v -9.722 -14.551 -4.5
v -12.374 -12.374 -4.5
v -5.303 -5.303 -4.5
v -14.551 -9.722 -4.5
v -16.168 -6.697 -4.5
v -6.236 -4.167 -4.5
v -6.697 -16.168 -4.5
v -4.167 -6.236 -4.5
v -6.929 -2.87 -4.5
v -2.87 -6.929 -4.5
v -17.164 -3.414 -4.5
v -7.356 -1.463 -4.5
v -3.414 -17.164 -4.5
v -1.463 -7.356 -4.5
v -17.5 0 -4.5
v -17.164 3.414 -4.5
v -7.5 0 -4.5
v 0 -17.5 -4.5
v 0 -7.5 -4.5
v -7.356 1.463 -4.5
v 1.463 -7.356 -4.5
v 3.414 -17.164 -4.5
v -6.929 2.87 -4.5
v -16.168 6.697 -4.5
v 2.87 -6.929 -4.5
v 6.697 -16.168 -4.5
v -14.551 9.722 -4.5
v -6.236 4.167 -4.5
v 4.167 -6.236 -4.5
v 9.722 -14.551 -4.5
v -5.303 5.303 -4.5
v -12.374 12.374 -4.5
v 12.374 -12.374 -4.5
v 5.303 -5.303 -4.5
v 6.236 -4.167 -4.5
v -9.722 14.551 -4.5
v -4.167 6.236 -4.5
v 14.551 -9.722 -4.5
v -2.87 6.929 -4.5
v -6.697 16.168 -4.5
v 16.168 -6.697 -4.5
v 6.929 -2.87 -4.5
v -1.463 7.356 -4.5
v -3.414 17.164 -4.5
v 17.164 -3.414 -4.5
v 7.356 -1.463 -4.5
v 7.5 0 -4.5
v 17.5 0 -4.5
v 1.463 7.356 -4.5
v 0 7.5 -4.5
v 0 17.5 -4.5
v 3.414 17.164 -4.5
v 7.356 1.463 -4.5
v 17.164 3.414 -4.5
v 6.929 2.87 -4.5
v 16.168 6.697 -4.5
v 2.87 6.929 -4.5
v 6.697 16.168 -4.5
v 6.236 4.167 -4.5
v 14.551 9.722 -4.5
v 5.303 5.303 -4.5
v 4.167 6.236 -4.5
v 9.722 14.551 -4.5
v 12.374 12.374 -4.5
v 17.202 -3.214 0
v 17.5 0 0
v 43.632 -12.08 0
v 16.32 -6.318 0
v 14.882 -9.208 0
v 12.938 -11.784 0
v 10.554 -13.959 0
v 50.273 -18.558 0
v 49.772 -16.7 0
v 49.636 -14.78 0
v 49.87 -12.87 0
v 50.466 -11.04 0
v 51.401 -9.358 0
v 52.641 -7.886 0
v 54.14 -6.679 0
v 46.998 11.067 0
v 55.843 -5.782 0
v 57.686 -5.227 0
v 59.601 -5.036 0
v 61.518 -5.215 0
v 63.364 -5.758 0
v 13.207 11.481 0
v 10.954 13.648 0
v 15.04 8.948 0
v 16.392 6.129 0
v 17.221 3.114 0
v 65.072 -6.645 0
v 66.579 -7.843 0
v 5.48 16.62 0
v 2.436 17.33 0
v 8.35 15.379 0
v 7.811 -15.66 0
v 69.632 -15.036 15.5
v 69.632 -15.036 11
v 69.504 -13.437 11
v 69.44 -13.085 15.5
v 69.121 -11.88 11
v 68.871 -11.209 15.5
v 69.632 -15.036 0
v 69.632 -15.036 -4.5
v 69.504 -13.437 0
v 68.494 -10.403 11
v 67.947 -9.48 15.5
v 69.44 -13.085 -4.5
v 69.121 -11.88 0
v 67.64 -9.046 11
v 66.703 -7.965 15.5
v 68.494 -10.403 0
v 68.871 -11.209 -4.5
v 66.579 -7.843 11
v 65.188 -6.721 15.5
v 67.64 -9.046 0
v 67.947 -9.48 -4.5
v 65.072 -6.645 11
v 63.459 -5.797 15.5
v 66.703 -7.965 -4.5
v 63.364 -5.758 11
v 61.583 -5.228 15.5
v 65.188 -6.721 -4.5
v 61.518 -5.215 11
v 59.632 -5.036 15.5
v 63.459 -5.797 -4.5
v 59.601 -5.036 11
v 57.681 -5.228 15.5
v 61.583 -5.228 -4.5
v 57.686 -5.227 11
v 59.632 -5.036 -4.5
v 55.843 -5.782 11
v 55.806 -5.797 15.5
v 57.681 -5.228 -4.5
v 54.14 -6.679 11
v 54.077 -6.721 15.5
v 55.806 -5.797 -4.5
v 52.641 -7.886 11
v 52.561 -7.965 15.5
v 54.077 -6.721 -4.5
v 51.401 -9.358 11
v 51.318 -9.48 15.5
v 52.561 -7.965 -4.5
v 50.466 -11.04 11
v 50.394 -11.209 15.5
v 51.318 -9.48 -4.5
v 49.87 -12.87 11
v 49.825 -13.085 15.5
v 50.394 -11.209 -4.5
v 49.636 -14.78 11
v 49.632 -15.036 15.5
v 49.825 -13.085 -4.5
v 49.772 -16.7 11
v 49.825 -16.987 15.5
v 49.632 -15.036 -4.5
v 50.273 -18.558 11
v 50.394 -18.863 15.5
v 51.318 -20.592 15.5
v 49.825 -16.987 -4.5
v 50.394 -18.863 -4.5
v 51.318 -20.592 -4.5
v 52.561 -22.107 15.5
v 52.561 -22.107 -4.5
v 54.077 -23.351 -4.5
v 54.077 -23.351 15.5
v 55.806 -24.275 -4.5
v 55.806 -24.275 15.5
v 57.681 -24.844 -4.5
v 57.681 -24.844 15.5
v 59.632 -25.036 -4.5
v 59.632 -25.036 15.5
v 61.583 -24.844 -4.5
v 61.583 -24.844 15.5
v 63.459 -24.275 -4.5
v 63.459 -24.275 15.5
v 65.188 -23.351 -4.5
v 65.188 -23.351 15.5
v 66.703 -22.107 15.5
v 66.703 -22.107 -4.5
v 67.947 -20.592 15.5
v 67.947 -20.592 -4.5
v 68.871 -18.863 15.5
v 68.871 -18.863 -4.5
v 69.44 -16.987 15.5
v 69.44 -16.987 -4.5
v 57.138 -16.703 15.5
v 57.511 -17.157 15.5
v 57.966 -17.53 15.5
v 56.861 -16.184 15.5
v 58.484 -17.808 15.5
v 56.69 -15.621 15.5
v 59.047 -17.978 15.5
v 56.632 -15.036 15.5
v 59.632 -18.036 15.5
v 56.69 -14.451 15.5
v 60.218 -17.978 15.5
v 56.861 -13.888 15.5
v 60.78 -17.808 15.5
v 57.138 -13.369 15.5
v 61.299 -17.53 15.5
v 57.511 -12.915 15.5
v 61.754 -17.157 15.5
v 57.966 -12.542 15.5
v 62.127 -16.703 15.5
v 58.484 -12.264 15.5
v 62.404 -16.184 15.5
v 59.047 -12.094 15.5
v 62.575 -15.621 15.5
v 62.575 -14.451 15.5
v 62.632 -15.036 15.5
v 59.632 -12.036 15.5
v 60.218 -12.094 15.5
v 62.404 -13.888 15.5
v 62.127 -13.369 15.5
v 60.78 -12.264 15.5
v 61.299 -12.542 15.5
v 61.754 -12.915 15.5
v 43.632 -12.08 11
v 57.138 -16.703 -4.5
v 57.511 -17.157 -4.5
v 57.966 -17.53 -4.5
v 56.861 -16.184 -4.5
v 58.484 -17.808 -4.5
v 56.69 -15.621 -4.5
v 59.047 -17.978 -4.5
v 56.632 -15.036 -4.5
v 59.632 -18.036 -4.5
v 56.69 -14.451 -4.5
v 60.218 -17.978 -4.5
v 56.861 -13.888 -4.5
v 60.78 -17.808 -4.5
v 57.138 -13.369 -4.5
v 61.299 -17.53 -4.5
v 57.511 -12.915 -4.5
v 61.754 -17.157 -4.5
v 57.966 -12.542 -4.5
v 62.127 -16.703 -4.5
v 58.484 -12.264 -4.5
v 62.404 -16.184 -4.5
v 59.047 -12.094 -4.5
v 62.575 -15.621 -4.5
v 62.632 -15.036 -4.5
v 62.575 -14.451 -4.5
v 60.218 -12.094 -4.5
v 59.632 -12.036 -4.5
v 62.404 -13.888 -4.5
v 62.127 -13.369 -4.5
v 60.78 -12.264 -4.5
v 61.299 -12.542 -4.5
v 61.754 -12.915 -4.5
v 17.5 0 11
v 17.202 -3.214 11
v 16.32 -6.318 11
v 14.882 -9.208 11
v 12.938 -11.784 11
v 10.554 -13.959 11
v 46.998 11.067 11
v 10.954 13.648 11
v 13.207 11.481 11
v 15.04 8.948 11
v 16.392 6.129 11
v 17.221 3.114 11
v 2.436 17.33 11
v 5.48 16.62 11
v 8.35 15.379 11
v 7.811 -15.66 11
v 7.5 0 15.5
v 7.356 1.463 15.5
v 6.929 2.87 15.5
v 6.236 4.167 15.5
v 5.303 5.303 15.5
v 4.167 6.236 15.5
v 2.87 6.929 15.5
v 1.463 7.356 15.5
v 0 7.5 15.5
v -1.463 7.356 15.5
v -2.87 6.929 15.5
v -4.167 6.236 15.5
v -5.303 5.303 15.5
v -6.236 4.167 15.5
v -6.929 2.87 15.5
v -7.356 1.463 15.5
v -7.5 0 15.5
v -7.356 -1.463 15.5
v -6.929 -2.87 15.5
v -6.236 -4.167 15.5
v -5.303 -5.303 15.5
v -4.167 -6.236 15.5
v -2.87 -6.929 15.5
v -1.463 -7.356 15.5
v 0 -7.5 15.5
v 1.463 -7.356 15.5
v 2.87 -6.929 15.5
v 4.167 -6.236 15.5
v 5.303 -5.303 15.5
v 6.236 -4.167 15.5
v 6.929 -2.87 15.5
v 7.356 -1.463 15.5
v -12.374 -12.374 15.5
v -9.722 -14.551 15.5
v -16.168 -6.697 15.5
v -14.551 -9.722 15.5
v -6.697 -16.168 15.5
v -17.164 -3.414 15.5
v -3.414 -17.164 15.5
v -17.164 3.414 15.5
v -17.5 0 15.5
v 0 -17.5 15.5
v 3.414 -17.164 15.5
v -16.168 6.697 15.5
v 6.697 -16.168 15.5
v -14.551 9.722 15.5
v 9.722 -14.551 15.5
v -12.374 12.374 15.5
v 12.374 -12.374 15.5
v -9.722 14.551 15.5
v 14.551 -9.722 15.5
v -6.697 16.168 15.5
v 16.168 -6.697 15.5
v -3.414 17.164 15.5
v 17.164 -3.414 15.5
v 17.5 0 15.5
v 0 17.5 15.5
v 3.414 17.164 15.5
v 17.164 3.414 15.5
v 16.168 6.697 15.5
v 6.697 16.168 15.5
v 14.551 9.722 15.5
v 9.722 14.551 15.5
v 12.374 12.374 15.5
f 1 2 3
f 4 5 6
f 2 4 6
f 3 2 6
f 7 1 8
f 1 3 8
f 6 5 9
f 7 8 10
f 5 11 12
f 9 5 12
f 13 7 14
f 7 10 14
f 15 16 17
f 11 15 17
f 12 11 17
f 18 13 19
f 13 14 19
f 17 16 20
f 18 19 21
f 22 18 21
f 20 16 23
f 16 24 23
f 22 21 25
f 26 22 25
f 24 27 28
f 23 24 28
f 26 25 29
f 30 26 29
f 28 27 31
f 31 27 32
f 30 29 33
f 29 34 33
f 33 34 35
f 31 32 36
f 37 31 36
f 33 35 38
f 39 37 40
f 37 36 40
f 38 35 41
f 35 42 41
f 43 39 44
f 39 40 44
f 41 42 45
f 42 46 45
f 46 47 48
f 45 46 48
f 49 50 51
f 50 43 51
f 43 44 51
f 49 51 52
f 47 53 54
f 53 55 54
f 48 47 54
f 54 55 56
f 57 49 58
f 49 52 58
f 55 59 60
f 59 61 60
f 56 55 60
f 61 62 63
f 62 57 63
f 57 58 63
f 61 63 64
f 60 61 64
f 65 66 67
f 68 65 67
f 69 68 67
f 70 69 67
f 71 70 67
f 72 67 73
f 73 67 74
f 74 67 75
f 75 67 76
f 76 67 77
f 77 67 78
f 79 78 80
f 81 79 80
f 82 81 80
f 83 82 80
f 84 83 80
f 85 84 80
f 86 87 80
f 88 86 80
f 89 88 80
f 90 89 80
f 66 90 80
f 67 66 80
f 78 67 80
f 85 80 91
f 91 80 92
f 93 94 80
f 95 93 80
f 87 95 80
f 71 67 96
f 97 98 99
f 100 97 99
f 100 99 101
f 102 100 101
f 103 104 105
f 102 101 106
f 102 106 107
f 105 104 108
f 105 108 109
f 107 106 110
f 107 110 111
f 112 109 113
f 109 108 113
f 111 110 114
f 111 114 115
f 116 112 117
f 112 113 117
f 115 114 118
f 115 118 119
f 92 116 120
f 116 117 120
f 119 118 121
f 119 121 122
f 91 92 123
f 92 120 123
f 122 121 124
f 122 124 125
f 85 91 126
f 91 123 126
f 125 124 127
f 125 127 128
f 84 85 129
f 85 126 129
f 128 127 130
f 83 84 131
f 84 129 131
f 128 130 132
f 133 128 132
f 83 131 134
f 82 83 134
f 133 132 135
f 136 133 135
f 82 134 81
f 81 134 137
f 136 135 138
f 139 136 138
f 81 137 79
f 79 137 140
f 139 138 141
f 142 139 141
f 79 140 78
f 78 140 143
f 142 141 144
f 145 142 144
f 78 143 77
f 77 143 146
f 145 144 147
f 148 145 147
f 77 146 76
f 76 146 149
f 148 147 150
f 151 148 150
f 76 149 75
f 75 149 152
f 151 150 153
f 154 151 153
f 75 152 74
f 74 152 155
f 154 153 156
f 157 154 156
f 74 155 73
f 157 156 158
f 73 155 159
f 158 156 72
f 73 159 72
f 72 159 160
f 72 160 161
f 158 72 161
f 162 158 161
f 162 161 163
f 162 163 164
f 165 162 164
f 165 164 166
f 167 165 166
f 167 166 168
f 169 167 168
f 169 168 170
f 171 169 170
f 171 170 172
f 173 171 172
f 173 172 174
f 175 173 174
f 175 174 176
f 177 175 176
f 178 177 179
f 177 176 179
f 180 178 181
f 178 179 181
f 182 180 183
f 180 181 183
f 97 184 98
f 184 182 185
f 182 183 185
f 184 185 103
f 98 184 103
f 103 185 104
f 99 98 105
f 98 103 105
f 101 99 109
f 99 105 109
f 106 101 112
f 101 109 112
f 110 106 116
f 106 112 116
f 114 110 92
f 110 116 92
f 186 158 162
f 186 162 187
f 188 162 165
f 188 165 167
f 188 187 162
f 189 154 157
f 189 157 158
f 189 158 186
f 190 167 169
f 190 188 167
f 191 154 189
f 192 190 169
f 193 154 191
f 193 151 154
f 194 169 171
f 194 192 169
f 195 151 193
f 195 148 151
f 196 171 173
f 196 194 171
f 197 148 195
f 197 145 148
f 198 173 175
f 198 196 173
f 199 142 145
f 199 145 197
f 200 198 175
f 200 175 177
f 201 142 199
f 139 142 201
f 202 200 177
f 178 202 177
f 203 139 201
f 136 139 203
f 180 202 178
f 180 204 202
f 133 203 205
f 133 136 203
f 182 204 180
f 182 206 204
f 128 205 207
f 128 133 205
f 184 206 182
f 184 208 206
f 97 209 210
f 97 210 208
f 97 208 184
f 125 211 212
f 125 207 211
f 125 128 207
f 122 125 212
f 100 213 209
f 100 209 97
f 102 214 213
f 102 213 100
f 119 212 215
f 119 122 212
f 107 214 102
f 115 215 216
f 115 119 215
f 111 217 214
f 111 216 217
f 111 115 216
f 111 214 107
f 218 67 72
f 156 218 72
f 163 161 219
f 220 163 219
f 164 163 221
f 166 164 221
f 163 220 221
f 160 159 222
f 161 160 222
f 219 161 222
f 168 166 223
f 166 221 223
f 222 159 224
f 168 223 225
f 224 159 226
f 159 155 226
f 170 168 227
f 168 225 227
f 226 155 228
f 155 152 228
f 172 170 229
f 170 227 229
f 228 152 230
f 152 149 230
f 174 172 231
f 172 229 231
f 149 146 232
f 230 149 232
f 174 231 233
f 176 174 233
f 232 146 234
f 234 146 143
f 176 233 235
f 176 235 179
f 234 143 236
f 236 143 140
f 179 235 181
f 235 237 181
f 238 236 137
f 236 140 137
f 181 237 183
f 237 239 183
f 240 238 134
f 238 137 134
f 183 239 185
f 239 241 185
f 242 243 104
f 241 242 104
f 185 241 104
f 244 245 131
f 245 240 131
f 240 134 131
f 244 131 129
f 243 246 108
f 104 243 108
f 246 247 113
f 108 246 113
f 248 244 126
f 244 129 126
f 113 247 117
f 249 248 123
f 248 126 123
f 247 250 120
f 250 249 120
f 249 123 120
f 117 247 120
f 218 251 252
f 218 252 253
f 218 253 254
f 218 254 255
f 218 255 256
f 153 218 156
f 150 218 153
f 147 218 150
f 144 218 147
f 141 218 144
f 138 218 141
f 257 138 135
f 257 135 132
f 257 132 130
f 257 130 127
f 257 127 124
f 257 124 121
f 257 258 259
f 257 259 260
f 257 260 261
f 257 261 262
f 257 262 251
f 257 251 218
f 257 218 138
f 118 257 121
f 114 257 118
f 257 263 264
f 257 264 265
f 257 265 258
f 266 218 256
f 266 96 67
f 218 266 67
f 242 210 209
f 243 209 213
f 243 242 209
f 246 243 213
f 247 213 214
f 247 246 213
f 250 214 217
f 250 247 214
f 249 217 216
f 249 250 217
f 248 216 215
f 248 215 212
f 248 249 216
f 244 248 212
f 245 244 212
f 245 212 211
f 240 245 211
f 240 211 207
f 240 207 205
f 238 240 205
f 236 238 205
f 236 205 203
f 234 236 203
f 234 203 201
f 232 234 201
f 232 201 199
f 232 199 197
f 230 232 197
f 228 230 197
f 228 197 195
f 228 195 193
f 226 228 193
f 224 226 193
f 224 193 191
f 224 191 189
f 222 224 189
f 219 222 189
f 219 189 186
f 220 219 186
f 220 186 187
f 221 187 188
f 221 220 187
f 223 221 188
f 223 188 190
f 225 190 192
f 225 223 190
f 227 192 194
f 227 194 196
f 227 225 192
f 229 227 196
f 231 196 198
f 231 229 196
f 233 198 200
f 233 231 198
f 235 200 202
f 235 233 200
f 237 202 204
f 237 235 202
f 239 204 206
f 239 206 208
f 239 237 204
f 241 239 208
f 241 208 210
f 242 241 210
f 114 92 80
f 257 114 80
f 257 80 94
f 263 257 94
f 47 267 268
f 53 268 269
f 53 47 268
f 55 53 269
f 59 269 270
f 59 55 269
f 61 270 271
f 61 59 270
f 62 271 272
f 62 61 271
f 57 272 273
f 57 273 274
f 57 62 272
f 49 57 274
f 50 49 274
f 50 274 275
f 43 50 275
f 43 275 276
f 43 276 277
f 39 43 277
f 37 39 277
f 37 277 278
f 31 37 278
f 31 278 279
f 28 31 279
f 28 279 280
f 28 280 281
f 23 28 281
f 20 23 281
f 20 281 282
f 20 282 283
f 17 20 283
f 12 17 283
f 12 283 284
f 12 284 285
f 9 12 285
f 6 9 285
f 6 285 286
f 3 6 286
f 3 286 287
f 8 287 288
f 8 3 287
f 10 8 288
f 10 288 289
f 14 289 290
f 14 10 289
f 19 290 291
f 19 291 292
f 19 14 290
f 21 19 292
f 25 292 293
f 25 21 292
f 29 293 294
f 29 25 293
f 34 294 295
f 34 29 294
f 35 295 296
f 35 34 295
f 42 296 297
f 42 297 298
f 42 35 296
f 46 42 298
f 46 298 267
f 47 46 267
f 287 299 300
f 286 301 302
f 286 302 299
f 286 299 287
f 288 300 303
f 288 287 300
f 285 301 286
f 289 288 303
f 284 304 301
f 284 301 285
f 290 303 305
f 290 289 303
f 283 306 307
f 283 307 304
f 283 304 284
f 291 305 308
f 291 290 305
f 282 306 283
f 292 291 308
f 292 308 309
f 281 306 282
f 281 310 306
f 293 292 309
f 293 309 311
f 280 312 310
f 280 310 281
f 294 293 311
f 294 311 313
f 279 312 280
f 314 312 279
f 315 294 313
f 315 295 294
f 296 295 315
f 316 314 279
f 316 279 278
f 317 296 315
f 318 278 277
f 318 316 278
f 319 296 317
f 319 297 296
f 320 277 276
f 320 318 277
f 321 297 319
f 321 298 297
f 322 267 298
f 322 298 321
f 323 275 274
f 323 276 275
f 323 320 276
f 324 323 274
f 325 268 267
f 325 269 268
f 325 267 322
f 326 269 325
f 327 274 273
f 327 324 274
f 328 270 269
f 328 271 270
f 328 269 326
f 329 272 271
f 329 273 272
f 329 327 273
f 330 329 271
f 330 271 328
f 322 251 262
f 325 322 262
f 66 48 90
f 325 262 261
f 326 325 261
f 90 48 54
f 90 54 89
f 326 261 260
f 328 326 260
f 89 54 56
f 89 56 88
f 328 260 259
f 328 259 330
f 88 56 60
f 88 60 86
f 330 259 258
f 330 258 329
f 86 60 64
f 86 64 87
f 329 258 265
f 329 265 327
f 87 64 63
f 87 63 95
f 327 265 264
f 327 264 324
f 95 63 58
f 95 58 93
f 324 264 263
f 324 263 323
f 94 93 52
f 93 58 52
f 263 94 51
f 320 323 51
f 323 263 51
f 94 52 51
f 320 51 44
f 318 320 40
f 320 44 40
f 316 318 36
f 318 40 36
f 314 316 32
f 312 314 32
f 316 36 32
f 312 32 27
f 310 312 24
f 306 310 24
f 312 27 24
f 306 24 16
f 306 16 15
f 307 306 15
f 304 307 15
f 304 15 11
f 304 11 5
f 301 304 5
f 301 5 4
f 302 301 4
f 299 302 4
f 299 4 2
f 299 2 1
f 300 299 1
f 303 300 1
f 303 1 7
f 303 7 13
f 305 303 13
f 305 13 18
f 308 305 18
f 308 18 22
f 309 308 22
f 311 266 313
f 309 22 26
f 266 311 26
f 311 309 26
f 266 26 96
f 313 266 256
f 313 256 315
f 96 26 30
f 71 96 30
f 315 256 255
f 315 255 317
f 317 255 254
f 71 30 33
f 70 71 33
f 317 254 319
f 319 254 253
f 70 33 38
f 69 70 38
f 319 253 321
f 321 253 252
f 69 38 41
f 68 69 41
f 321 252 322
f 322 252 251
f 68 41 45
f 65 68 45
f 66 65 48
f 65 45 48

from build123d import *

# Parameters (mm, degrees)
ESQUISSE1_R             = 3
ESQUISSE1_R_2           = 7.5
BOSS_EXTRU_1_DEPTH      = 11
BOSS_EXTRU_2_DEPTH      = 15.5
BOSS_EXTRU_2_DEPTH_BACK = 4.5
ESQUISSE1_3_R           = 17.5
ESQUISSE1_3_R_2         = 7.5
ESQUISSE1_3_R_3         = 10
ESQUISSE1_3_R_4         = 3


with BuildPart() as part:
    # Esquisse1 → Boss.-Extru.1 (new body)
    with BuildSketch(Plane.XY):
        with BuildLine():
            Line((46.997592, 11.066902), (2.435529, 17.329691))
            ThreePointArc((2.435529, 17.329691), (-17.272219, -2.814332), (7.810886, -15.660142))
            Line((7.810886, -15.660142), (43.632384, -12.079599))
            Line((43.632384, -12.079599), (50.273259, -18.558336))
            ThreePointArc((50.273259, -18.558336), (65.124357, -23.392938), (66.578968, -7.842613))
            Line((66.578968, -7.842613), (46.997592, 11.066902))
        make_face()
        with Locations((59.632384, -15.036011)):
            Circle(ESQUISSE1_R, mode=Mode.SUBTRACT)
        Circle(ESQUISSE1_R_2, mode=Mode.SUBTRACT)
    extrude(amount=BOSS_EXTRU_1_DEPTH)

    # Esquisse1<3> → Boss.-Extru.2 (add, two sides: drawn at the far end of the back side and taken through both)
    # profile 1 of 2: a face of its own
    with BuildSketch(Plane.XY.offset(-BOSS_EXTRU_2_DEPTH_BACK)):
        Circle(ESQUISSE1_3_R)
        Circle(ESQUISSE1_3_R_2, mode=Mode.SUBTRACT)
    # profile 2 of 2: a face of its own
    with BuildSketch(Plane.XY.offset(-BOSS_EXTRU_2_DEPTH_BACK)):
        with Locations((59.632384, -15.036011)):
            Circle(ESQUISSE1_3_R_3)
        with Locations((59.632384, -15.036011)):
            Circle(ESQUISSE1_3_R_4, mode=Mode.SUBTRACT)
    extrude(amount=BOSS_EXTRU_2_DEPTH + BOSS_EXTRU_2_DEPTH_BACK)


solid = part.part
